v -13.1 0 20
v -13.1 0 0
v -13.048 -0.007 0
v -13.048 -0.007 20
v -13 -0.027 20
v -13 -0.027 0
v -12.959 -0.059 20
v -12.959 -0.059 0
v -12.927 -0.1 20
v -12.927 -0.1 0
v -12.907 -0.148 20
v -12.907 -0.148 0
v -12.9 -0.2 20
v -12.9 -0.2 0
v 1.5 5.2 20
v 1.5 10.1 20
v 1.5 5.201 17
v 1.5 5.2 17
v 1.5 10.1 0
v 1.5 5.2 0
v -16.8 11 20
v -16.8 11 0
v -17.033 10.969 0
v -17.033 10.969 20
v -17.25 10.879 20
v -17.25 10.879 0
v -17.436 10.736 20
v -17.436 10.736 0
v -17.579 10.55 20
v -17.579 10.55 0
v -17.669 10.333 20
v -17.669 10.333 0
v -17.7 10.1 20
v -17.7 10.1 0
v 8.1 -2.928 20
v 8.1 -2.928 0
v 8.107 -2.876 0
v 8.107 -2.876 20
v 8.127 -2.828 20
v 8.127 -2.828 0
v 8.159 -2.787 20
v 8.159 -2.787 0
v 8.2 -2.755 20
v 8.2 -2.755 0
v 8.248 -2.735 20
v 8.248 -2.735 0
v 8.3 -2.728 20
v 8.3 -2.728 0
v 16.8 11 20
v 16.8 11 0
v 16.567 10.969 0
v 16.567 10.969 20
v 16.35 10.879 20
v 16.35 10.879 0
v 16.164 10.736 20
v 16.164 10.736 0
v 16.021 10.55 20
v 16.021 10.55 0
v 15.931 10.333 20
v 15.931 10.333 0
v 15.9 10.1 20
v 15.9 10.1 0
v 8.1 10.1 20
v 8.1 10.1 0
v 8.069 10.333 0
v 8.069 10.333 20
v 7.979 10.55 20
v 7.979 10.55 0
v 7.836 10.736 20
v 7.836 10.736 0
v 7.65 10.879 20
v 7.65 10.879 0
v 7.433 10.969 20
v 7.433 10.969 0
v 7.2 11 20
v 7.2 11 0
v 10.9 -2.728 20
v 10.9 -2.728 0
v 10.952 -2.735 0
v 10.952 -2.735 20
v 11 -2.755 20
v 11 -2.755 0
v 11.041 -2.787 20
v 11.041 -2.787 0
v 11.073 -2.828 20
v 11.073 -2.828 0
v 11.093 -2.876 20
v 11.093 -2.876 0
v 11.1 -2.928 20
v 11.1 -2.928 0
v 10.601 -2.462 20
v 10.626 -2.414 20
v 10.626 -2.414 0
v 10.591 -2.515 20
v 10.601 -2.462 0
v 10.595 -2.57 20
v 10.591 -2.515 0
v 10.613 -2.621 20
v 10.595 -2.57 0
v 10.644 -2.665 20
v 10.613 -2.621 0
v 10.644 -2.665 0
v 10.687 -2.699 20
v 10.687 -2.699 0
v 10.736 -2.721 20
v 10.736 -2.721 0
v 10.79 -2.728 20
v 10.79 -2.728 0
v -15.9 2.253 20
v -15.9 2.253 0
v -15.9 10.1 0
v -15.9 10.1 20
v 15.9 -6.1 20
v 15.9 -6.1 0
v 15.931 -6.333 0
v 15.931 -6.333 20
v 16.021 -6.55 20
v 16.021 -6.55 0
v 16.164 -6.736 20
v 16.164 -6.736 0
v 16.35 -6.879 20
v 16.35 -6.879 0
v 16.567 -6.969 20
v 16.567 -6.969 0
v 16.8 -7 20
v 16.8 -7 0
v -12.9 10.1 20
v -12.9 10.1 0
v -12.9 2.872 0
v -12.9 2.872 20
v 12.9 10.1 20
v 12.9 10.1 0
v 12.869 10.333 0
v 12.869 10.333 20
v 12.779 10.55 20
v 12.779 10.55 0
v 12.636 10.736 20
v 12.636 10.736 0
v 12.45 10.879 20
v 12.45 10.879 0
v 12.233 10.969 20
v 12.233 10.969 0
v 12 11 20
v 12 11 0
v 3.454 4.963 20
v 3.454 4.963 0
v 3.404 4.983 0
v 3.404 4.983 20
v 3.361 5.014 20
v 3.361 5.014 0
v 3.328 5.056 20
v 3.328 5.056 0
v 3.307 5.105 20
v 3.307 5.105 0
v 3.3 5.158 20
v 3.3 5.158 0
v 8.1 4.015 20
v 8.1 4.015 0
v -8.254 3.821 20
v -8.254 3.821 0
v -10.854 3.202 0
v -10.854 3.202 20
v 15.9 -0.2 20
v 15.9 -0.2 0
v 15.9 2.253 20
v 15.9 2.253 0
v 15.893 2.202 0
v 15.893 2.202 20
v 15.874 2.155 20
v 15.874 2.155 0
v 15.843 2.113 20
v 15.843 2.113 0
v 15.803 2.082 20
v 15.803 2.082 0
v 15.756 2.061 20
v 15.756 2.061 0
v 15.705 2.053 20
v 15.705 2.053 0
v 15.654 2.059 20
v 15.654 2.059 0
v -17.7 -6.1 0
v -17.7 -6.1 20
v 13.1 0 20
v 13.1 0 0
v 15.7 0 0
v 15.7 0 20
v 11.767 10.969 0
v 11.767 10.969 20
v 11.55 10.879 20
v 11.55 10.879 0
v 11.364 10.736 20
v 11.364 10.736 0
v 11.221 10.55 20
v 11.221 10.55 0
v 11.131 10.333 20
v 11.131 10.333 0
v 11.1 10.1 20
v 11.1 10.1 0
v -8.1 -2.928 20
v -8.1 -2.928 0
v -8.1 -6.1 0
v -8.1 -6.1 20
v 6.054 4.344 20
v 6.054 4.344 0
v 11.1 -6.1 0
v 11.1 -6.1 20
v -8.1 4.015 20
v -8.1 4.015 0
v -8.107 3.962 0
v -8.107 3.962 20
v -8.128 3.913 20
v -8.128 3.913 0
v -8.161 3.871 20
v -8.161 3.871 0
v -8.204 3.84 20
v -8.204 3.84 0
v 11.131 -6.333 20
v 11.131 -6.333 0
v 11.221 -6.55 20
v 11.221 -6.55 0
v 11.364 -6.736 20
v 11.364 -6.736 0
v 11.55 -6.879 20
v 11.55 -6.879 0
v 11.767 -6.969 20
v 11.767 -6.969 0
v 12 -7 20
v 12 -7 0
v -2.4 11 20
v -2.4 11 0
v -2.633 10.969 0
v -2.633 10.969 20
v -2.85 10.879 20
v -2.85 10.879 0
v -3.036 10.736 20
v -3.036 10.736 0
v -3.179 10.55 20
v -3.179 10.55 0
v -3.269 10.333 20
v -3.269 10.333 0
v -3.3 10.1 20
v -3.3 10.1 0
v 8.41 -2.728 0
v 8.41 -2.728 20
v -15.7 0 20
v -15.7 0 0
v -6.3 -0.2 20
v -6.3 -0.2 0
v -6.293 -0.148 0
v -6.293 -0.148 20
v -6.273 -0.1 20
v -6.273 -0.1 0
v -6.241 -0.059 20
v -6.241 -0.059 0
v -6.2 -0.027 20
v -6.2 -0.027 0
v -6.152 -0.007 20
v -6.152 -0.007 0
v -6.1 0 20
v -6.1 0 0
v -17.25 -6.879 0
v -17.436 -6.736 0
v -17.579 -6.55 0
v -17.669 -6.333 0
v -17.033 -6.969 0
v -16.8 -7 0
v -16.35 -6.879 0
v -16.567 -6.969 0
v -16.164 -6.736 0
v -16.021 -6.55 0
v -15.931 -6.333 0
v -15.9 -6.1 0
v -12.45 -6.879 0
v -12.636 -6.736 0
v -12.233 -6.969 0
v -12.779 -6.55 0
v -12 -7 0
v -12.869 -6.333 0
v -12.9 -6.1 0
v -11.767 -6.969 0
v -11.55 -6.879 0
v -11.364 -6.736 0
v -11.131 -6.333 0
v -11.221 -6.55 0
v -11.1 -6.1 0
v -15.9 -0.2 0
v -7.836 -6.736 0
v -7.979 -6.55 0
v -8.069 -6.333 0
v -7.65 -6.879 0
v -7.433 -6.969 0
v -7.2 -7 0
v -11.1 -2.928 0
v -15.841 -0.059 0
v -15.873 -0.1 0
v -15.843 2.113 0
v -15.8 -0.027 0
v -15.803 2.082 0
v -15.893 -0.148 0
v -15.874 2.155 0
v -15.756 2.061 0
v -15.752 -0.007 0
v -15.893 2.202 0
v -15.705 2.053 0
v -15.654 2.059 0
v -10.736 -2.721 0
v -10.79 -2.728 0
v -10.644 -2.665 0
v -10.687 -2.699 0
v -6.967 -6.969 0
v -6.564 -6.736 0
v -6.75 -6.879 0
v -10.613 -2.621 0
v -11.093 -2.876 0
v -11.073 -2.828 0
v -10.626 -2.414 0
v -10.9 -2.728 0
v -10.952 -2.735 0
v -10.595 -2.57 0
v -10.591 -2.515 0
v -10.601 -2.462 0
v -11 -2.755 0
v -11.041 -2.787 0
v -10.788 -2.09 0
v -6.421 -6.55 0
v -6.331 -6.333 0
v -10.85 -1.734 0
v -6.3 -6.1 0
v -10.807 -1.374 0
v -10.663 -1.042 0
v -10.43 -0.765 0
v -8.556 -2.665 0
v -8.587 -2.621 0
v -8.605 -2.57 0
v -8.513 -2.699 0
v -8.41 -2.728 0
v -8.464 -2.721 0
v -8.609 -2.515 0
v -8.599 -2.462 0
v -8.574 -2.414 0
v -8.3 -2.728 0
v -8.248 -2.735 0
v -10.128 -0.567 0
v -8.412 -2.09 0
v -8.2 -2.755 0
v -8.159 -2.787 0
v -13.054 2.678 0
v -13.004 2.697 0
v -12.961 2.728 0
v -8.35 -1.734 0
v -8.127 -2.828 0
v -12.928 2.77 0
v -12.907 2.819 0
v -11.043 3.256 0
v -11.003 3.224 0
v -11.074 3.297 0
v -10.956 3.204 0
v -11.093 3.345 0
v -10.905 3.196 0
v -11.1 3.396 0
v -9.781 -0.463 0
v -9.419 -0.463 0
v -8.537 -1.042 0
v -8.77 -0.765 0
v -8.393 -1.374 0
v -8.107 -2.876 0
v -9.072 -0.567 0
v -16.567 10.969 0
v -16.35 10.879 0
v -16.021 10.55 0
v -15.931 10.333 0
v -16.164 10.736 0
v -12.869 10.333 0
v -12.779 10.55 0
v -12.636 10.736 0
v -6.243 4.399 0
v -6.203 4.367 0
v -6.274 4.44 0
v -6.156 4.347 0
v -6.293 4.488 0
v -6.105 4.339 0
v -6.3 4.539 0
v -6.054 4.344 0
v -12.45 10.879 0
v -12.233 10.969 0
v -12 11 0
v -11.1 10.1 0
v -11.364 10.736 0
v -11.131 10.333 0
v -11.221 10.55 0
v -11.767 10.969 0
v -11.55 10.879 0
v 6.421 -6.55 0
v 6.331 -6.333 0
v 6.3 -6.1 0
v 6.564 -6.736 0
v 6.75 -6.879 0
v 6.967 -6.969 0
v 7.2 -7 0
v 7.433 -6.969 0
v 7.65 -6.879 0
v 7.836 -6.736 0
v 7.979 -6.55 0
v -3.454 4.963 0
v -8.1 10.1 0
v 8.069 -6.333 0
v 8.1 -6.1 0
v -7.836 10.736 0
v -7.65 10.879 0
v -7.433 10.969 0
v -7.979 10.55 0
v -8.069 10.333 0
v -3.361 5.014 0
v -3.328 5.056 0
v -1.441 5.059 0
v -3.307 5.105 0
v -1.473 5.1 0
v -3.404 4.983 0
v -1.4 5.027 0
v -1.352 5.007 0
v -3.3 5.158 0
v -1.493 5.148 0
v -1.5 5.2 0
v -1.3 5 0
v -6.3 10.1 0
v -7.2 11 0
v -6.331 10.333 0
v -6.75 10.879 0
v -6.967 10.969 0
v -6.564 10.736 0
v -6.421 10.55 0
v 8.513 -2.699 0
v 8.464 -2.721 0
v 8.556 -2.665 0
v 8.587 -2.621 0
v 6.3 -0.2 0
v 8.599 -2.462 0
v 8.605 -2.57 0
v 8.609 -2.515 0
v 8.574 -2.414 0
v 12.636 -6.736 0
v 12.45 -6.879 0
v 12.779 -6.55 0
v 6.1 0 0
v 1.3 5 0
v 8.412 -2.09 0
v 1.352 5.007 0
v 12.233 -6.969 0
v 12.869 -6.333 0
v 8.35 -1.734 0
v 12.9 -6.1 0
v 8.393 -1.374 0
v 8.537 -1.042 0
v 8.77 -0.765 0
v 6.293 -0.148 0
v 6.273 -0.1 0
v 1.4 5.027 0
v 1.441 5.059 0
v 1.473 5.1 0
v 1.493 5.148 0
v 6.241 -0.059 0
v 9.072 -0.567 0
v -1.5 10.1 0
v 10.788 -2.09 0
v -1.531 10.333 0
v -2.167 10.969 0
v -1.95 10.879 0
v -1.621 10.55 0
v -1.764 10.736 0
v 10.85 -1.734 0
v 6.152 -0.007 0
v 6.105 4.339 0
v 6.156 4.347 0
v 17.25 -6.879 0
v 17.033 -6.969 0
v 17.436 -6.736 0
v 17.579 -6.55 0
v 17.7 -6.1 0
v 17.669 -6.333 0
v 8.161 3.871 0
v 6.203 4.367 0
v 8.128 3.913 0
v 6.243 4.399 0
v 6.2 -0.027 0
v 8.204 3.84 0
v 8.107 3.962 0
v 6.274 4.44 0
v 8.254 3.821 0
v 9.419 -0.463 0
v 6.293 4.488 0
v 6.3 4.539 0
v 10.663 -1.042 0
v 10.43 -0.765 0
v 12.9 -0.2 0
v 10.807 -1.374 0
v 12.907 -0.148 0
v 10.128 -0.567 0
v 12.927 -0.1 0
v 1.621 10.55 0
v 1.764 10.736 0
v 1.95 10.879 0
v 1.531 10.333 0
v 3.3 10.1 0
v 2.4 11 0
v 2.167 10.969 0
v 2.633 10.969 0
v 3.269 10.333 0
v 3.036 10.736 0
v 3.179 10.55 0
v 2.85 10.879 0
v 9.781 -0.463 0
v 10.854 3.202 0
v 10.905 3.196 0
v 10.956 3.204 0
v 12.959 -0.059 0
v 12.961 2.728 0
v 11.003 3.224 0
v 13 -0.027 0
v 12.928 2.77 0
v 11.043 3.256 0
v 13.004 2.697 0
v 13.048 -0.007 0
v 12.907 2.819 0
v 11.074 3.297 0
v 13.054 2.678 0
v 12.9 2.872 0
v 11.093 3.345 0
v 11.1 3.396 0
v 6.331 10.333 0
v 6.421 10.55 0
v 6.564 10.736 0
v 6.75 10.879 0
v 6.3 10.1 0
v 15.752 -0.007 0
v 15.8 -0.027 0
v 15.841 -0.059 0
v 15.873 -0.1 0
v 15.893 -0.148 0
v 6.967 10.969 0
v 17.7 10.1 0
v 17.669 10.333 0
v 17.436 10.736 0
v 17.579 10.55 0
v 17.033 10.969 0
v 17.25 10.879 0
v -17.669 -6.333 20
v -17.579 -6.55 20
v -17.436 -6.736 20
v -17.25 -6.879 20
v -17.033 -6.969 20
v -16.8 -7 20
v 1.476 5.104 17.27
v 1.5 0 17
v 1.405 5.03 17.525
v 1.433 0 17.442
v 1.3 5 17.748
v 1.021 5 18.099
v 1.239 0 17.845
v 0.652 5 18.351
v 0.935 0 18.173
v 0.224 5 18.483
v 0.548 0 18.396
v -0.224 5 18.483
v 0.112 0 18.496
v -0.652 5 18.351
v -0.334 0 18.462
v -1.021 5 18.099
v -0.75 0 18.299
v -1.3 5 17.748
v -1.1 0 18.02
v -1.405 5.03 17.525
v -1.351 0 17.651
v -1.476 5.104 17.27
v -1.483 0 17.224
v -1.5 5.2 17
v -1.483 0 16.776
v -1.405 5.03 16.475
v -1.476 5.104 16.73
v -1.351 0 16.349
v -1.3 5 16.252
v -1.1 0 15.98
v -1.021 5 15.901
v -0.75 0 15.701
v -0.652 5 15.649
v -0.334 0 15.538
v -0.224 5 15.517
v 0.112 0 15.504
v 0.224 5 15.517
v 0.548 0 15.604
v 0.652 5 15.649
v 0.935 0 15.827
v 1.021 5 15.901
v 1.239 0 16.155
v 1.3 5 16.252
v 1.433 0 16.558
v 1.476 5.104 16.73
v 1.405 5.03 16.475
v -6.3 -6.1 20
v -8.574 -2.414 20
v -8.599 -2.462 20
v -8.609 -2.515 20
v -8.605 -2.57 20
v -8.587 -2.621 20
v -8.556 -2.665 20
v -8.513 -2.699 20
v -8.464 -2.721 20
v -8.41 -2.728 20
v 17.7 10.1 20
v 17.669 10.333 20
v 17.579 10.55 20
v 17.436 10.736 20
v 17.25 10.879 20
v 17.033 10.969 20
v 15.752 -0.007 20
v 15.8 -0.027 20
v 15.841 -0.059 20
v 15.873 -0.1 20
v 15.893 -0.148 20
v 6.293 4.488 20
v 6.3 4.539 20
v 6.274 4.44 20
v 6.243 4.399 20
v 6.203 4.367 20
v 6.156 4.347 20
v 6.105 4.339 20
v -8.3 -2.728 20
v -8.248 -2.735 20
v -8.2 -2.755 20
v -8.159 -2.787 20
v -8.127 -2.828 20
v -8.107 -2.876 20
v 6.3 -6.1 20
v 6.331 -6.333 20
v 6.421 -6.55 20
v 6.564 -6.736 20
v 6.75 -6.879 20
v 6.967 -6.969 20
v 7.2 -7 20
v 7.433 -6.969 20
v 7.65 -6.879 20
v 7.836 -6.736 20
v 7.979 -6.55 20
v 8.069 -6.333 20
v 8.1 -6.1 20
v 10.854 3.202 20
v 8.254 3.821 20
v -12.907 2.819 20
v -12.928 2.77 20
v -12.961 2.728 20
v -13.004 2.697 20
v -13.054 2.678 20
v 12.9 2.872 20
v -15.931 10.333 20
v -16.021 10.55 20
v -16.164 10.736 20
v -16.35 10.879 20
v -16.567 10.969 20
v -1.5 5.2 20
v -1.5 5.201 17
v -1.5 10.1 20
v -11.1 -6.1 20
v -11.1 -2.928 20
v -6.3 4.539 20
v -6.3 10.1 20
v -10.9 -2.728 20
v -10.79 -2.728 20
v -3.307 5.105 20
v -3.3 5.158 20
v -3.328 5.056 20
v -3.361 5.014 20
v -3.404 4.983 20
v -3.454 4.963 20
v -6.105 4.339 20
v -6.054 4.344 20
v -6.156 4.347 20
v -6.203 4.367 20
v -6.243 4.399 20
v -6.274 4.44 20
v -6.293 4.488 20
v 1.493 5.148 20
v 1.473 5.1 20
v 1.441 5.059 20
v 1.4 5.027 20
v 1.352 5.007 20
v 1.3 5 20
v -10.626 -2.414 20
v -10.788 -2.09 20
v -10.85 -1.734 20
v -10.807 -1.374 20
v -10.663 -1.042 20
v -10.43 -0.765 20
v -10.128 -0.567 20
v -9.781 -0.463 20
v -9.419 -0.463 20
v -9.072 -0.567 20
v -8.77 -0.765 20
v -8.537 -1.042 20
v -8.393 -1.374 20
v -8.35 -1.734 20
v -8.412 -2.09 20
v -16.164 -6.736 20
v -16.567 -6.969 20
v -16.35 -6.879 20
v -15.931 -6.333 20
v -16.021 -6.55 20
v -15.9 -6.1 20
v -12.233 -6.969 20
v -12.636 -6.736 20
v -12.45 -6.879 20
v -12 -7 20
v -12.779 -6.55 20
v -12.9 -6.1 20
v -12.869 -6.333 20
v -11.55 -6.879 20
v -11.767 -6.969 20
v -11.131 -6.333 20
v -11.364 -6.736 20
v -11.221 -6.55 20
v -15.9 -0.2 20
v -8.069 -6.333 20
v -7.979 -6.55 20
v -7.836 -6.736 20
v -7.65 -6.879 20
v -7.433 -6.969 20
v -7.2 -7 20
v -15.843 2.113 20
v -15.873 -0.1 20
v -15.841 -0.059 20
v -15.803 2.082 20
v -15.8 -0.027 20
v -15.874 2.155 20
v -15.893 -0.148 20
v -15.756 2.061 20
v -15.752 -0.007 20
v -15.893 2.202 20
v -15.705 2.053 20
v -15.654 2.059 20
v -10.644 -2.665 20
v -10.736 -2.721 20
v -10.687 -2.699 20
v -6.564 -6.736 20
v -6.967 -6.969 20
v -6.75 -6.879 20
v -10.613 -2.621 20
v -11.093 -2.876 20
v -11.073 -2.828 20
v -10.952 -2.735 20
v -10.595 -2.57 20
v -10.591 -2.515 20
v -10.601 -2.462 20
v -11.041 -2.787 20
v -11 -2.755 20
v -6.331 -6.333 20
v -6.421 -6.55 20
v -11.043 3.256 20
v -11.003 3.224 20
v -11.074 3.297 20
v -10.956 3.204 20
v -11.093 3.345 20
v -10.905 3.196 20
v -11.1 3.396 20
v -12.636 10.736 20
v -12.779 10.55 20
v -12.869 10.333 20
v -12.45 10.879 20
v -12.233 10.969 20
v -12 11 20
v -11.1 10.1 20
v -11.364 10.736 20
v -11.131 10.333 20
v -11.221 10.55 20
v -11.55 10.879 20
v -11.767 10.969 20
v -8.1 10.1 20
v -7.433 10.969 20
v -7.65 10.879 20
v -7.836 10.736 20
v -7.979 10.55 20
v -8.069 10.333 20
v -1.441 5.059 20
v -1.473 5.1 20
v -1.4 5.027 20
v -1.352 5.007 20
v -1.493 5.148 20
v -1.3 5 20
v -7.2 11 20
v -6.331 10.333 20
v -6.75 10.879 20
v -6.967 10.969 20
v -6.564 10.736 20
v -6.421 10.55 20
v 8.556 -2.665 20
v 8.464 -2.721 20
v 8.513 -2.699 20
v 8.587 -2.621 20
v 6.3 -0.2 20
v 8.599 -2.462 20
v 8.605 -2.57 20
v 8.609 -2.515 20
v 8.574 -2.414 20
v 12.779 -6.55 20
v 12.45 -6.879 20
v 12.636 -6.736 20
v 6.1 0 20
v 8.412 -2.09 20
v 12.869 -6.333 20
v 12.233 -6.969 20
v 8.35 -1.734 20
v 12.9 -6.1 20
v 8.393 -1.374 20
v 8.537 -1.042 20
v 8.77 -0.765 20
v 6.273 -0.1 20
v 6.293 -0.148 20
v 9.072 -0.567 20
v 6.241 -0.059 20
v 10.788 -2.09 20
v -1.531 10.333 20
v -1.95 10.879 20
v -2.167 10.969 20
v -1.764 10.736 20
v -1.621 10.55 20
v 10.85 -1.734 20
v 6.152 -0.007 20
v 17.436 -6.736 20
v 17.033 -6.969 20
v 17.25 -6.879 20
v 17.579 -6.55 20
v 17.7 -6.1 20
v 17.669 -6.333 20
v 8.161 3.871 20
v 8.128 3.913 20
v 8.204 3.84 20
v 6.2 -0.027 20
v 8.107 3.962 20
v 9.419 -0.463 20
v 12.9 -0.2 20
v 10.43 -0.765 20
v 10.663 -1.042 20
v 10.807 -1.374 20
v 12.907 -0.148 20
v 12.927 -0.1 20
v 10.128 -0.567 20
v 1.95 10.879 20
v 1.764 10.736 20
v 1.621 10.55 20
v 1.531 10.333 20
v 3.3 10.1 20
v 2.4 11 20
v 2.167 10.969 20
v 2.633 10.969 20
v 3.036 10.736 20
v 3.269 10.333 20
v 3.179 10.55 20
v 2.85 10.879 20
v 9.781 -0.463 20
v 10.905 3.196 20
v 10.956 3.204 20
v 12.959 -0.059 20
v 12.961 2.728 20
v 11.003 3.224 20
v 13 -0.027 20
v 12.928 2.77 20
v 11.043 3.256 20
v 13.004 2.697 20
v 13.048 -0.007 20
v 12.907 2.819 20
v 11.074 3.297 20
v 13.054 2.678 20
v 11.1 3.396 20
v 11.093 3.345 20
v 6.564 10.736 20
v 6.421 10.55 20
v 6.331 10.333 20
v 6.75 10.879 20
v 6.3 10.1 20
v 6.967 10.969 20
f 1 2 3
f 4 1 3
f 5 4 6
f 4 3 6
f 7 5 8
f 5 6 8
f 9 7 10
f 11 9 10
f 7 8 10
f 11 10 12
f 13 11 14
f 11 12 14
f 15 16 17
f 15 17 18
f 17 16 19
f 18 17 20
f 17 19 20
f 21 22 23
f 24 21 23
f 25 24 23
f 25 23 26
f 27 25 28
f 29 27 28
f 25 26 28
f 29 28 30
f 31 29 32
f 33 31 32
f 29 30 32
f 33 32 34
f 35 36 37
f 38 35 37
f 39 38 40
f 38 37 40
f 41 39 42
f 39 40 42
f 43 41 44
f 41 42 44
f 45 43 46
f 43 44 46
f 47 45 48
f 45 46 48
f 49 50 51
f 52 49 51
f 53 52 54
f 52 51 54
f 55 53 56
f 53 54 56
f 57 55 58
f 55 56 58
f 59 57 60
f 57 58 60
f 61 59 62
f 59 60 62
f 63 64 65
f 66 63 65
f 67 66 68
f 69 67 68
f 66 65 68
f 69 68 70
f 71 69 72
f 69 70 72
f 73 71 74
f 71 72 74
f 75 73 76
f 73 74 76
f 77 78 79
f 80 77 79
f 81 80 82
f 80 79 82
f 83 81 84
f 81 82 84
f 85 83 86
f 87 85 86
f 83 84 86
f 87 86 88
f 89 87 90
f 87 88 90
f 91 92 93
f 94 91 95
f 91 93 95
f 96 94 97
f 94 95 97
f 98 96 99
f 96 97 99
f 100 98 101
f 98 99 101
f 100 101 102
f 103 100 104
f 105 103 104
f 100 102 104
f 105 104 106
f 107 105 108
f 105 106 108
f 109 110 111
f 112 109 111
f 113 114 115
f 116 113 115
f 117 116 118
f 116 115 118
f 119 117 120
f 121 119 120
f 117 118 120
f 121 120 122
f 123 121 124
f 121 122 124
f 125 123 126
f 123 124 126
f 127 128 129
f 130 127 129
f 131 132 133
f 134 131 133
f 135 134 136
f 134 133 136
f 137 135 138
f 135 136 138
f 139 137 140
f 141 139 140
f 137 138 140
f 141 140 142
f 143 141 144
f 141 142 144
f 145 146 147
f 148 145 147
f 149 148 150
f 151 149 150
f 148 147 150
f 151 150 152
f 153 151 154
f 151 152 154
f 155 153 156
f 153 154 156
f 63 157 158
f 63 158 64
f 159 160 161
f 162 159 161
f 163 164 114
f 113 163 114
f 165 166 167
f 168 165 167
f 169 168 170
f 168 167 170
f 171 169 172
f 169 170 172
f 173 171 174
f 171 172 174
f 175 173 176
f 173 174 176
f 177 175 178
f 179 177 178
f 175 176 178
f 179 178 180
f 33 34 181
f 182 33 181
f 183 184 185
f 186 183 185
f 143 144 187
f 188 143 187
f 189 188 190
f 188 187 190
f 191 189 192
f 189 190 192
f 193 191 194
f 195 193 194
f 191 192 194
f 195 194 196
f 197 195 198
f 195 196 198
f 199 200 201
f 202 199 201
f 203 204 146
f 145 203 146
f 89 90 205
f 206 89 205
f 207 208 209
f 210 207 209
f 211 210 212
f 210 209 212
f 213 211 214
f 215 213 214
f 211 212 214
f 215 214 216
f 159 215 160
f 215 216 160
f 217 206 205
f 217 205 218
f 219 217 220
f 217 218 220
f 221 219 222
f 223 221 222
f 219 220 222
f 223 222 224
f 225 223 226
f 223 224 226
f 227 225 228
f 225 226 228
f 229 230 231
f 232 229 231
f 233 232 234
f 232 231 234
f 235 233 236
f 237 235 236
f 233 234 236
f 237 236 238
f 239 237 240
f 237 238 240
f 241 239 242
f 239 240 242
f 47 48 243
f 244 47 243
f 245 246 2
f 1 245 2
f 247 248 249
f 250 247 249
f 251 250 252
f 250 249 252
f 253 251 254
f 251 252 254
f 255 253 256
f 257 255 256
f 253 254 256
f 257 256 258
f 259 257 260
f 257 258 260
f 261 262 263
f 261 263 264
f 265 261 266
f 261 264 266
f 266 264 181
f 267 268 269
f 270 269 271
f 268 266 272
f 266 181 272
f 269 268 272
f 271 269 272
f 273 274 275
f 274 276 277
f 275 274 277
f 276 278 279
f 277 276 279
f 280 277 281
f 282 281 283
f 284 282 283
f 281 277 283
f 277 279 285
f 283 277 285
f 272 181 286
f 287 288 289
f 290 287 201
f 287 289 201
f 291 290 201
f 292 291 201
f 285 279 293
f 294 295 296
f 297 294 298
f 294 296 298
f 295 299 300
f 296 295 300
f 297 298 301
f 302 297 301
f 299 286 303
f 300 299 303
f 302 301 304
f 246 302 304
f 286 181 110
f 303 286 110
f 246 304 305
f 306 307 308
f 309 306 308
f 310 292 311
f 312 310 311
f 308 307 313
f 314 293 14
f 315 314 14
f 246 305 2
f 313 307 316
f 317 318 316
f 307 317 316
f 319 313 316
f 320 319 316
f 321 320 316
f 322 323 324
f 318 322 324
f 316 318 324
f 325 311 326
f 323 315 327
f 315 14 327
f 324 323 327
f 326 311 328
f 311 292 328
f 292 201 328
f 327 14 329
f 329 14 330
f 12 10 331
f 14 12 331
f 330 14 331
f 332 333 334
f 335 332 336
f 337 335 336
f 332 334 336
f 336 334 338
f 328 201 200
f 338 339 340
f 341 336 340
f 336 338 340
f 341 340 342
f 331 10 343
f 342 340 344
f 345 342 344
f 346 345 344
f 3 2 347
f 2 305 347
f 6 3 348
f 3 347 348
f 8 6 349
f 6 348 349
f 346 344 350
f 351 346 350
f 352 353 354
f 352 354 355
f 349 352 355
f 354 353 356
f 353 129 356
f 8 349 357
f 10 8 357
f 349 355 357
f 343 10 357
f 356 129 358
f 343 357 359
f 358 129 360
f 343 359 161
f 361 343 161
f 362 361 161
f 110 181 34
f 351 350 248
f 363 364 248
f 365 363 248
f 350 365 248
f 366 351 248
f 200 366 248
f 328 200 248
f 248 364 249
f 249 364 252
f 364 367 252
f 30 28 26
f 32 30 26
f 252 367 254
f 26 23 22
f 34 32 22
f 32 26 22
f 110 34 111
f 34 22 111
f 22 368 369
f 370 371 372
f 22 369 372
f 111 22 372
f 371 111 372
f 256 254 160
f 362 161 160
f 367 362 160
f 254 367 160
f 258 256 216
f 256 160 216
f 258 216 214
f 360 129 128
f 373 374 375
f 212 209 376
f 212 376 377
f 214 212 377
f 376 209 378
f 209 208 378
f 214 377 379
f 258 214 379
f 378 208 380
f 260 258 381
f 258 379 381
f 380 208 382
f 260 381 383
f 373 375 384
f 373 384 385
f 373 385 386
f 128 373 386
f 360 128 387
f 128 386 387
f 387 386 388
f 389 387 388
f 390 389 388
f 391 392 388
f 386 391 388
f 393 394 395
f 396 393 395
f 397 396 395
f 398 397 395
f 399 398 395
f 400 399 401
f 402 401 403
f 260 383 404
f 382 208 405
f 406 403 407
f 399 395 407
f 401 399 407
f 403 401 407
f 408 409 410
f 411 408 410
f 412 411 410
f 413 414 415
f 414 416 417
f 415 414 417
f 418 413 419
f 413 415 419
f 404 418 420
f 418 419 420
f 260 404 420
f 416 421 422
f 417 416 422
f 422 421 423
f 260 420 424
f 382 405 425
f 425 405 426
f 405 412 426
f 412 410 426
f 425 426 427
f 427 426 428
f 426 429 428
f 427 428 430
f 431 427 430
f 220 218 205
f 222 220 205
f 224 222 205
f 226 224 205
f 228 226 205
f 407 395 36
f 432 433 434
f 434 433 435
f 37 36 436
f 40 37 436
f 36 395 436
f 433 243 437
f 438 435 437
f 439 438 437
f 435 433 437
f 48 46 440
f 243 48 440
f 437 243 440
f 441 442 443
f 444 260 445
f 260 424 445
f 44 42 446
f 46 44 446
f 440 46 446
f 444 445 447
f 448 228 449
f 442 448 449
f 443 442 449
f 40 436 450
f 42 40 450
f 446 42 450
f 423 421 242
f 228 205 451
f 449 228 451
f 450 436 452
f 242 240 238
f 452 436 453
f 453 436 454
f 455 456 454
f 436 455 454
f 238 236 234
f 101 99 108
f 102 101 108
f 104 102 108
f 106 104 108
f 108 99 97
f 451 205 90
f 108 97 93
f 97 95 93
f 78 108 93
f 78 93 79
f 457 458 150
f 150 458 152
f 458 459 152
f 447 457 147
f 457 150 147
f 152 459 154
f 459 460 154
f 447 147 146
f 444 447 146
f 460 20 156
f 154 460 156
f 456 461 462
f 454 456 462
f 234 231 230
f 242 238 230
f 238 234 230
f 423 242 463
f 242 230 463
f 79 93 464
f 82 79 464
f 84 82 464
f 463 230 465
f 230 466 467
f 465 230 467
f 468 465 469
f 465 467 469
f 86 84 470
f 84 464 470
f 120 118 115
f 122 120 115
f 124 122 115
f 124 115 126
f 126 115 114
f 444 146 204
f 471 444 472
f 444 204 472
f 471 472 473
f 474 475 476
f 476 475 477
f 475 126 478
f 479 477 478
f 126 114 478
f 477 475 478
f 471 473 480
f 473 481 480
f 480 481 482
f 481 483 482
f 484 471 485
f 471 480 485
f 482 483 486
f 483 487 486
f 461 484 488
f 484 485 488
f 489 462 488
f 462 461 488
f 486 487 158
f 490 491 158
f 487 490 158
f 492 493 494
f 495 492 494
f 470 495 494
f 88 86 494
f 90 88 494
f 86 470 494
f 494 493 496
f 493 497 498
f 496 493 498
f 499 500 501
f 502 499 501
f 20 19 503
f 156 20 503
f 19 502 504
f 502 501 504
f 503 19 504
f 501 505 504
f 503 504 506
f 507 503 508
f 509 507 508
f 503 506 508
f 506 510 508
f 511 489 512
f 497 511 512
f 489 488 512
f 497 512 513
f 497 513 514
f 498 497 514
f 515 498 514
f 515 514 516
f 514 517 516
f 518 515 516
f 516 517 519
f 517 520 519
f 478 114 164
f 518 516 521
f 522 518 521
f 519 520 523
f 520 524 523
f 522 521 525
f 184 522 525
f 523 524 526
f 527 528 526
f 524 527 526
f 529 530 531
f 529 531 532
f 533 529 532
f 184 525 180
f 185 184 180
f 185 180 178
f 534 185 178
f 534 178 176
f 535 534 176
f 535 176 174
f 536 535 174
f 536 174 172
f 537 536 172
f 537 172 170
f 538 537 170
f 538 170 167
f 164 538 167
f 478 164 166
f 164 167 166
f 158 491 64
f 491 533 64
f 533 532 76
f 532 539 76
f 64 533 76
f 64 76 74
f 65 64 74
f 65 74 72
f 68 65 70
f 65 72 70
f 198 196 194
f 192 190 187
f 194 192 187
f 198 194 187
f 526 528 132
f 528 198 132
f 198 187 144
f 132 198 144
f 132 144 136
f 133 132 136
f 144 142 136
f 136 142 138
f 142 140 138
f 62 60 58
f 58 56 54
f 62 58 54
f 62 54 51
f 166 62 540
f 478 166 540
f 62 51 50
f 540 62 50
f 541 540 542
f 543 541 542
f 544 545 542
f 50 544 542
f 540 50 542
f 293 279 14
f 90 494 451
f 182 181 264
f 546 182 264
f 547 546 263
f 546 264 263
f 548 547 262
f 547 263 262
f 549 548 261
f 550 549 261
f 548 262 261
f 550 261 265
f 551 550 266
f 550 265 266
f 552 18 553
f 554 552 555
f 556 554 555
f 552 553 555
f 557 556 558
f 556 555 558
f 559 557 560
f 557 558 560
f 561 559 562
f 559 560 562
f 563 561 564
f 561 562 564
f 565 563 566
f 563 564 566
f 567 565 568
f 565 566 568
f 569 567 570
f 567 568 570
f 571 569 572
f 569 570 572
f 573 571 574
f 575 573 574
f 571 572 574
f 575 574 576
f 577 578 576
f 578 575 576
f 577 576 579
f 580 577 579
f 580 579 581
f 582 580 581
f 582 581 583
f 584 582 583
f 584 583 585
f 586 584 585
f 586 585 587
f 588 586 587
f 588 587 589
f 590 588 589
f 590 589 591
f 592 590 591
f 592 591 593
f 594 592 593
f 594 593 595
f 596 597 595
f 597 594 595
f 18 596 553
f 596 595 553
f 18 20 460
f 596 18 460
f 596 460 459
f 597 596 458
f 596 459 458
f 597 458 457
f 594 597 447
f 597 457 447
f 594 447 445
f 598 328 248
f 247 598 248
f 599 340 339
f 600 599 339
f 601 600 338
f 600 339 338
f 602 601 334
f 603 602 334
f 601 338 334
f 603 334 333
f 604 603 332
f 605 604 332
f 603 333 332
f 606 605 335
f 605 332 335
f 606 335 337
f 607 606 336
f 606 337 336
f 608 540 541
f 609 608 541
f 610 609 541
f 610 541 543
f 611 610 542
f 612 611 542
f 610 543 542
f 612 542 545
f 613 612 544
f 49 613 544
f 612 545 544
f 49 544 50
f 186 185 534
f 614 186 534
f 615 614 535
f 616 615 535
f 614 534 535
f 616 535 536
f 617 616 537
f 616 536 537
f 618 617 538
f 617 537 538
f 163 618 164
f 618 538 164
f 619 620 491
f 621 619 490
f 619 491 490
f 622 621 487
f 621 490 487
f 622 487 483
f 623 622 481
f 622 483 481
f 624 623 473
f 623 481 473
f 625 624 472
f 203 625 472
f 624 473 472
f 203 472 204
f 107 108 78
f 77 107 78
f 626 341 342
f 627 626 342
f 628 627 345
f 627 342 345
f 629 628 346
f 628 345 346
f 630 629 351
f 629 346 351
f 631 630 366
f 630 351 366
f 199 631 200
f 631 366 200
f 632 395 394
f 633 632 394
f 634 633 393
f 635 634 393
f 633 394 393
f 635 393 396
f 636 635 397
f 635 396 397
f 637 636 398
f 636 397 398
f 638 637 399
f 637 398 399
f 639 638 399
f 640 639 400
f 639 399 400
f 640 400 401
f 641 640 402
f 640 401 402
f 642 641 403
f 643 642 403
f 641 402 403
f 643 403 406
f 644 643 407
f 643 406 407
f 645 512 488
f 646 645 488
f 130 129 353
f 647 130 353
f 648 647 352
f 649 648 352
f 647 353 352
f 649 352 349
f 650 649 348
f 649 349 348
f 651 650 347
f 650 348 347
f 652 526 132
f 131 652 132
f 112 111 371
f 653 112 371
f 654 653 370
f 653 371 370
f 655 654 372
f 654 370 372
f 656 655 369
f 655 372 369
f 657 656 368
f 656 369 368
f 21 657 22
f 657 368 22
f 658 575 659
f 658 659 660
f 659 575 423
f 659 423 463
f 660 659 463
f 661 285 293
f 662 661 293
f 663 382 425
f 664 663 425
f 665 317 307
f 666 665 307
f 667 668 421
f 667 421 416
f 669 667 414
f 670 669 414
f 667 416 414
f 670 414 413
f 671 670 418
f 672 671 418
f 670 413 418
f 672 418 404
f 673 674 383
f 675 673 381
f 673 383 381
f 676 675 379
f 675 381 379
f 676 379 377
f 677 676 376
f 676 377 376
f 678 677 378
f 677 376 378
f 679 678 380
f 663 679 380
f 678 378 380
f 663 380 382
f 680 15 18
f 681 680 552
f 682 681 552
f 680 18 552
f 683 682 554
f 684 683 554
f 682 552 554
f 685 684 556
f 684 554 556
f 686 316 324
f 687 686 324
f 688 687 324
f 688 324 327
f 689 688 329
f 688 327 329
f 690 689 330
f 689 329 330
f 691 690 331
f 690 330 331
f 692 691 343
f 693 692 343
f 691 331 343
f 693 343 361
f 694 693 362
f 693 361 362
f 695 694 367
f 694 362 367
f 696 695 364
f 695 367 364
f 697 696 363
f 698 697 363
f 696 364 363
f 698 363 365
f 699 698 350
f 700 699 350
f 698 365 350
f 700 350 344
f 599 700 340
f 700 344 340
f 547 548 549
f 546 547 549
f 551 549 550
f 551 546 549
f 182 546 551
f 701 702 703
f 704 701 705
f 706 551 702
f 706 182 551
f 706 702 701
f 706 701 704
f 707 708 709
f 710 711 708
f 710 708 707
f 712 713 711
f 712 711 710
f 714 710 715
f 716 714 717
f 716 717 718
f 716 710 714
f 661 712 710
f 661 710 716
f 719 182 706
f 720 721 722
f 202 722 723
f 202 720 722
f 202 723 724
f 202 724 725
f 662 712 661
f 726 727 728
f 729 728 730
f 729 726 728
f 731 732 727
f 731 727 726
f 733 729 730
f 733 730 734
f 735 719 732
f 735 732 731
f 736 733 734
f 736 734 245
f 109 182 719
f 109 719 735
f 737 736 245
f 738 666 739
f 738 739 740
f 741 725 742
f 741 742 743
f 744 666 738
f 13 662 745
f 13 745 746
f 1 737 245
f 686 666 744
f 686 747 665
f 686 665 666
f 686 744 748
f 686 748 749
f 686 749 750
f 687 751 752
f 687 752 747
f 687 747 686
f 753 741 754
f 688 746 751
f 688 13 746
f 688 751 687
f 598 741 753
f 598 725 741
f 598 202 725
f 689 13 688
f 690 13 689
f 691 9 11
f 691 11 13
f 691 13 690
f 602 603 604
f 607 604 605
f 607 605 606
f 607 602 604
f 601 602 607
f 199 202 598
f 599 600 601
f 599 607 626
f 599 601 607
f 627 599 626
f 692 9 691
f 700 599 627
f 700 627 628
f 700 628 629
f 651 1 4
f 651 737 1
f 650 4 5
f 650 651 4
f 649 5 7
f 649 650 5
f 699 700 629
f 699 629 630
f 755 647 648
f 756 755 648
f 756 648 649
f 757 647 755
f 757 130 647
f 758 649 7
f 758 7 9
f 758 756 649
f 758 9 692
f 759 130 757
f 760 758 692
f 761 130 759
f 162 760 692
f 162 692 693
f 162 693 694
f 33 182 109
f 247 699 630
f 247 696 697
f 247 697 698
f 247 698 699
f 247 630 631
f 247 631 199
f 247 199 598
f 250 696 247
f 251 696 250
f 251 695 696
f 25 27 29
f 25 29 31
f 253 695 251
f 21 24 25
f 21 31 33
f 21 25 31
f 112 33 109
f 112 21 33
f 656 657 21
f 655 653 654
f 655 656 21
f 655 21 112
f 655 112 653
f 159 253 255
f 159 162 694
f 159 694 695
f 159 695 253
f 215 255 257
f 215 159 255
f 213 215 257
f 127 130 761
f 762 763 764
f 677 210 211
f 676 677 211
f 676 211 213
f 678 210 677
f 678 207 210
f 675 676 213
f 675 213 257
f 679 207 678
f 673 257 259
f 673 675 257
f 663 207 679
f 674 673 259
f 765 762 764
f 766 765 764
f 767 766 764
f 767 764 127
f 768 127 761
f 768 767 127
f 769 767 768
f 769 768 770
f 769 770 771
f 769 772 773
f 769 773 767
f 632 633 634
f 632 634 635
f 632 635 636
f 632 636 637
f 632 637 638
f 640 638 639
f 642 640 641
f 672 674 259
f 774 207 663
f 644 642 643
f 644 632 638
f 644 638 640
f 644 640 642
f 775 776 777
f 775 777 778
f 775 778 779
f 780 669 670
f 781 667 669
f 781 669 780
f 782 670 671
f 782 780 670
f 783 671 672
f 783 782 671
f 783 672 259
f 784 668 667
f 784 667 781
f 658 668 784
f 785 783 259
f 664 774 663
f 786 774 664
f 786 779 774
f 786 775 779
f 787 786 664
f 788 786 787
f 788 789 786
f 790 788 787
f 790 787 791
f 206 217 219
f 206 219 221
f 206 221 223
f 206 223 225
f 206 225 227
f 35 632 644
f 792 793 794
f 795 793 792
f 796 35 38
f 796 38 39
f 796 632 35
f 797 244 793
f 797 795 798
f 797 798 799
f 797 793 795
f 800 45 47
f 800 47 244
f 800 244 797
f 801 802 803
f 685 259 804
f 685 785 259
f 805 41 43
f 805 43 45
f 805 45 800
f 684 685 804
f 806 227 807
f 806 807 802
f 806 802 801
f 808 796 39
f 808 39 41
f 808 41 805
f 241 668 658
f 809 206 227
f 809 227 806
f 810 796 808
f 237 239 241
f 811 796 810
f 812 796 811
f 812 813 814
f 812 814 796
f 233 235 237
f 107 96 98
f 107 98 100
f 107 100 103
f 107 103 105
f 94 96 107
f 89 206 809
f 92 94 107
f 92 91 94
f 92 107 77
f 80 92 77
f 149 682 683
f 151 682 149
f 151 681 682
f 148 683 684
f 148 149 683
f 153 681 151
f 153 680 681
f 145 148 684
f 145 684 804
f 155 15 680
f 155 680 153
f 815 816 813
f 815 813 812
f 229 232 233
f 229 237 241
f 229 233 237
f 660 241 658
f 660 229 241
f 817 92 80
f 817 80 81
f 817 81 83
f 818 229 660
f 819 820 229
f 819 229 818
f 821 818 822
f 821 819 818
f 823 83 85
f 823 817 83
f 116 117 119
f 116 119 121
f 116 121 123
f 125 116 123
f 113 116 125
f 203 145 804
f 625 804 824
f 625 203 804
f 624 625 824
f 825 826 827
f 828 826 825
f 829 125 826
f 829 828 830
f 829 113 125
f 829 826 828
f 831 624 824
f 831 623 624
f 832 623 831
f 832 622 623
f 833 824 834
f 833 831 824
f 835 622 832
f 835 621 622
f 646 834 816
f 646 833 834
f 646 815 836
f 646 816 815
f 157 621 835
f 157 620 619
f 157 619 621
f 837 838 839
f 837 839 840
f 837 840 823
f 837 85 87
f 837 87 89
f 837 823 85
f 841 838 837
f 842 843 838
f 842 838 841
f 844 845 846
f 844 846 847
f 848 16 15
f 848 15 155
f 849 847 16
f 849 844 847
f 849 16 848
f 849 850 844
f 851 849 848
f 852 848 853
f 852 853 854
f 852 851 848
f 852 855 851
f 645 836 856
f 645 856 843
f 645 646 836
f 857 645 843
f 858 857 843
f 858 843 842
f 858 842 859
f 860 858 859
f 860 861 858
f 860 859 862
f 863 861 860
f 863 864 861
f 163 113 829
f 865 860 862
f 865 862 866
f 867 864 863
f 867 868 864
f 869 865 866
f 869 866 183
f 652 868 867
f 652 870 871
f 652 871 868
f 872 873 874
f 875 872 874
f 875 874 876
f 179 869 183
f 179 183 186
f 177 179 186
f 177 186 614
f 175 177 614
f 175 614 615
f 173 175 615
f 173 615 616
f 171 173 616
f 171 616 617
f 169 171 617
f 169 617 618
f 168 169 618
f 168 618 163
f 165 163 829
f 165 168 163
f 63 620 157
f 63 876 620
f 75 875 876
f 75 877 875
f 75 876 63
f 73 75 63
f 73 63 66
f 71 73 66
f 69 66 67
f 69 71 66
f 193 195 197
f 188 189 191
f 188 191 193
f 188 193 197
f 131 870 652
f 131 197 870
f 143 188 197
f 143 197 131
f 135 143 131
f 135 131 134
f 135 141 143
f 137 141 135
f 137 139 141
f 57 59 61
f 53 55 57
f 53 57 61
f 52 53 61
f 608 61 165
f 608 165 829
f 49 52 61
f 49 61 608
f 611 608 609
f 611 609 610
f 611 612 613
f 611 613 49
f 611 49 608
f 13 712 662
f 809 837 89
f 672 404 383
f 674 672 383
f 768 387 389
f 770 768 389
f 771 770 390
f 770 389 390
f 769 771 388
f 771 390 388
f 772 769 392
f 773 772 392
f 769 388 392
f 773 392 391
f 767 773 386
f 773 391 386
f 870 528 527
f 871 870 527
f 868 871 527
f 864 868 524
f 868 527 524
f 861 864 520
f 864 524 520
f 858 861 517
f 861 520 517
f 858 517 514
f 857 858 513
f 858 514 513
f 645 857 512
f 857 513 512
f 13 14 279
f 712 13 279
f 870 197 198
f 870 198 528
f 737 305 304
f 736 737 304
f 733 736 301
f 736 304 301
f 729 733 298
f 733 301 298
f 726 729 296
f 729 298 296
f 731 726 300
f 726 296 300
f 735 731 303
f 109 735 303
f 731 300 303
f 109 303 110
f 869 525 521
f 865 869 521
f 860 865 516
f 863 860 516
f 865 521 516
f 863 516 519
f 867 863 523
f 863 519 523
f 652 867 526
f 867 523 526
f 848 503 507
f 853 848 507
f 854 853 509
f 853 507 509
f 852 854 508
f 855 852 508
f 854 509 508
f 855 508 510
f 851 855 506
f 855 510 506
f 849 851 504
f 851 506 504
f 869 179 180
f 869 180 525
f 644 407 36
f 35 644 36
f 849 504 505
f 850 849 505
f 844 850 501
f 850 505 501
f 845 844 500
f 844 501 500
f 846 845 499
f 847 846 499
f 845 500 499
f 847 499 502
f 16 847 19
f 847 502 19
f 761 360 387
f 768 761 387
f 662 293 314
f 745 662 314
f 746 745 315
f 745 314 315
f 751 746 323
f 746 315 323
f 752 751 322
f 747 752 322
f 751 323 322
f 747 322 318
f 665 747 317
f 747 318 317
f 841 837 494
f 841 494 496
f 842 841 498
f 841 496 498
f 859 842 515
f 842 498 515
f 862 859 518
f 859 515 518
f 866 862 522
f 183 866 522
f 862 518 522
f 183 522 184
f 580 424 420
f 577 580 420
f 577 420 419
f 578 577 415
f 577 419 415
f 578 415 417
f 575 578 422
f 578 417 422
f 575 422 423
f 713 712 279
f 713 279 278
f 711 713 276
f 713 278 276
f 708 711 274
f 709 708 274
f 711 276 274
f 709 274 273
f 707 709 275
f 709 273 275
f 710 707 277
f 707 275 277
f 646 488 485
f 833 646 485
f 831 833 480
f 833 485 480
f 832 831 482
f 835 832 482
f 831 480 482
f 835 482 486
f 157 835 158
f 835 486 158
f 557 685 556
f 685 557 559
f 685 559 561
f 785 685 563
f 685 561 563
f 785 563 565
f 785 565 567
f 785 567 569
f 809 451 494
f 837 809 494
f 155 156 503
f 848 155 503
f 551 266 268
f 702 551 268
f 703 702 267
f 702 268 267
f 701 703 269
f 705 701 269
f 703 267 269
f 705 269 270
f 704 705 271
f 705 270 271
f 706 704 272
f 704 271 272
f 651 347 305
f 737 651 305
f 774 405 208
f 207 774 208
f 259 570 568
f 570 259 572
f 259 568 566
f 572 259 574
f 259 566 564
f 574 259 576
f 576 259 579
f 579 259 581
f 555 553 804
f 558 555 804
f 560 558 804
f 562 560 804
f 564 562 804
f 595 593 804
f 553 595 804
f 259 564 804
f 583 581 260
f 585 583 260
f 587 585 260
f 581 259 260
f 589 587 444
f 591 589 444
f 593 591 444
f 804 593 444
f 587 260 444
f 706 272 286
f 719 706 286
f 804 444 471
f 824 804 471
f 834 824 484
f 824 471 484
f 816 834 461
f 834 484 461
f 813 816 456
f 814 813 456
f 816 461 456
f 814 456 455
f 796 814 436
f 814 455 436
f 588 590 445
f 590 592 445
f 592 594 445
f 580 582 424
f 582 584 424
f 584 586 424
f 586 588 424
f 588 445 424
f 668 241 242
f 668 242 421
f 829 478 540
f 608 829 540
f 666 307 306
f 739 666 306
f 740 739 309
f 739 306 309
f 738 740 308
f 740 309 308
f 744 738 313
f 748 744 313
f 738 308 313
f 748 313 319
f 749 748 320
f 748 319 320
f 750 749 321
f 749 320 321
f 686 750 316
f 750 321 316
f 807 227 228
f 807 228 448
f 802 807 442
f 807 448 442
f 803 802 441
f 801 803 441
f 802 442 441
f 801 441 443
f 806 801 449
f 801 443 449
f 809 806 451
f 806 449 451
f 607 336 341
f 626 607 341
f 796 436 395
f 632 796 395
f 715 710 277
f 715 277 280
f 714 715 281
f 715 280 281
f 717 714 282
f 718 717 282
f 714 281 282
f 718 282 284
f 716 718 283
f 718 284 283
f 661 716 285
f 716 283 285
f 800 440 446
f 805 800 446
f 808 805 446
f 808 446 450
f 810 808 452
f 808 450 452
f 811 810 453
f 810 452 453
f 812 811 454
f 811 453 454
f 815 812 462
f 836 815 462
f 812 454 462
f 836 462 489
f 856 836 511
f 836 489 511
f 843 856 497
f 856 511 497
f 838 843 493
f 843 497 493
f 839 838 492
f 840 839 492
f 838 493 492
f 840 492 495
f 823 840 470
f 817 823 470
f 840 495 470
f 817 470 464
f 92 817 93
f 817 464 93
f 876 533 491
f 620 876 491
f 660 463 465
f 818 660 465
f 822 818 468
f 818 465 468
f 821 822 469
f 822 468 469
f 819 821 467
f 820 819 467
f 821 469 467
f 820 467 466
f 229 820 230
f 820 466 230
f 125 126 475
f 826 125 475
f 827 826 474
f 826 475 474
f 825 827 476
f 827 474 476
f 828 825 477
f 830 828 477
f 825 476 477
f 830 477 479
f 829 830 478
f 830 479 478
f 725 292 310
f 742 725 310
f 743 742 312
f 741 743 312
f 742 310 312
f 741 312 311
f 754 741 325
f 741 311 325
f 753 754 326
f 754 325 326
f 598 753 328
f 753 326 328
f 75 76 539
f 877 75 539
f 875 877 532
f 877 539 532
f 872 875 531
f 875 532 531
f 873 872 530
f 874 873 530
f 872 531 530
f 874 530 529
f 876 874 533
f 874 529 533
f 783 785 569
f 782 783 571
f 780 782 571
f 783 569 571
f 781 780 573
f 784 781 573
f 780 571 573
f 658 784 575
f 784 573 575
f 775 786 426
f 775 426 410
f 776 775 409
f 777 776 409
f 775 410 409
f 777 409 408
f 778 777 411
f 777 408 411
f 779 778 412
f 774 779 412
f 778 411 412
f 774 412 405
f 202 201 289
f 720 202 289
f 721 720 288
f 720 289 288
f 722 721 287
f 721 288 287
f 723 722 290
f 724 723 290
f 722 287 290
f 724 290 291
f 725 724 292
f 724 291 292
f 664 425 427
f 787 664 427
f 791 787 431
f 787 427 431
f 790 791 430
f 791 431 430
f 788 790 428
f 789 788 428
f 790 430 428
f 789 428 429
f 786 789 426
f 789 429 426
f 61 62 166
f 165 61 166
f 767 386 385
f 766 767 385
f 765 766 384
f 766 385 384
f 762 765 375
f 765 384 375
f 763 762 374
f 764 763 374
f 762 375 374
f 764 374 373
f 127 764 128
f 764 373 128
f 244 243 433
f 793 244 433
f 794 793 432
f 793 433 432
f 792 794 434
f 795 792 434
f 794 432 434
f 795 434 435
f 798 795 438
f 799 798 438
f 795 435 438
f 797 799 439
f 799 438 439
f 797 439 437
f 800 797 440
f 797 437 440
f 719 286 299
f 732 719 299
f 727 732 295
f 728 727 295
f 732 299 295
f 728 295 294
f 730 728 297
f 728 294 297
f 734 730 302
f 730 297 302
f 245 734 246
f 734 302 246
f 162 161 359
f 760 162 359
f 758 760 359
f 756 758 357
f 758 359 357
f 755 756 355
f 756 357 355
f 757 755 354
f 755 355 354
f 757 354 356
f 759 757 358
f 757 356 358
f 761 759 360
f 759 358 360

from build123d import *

# Parameters (mm, degrees)
F1_DEPTH = 20
F2_R     = 1.5
F3_DEPTH = 5.2010001


with BuildPart() as f1:
    # F0 (on Top) → F1 (new body)
    with BuildSketch(Plane.XY):
        with BuildLine():
            Line((-17.7, 10.1), (-17.7, 0))
            Line((-17.7, 0), (-17.7, -6.1))
            ThreePointArc((-17.7, -6.1), (-17.4363961031, -6.7363961031), (-16.8, -7))
            ThreePointArc((-16.8, -7), (-16.1636038969, -6.7363961031), (-15.9, -6.1))
            Line((-15.9, -6.1), (-15.9, -2.9281131564))
            Line((-15.9, -2.9281131564), (-15.9, -0.2))
            ThreePointArc((-15.9, -0.2), (-15.8414213562, -0.0585786438), (-15.7, 0))
            Line((-15.7, 0), (-13.1, 0))
            ThreePointArc((-13.1, 0), (-12.9585786438, -0.0585786438), (-12.9, -0.2))
            Line((-12.9, -0.2), (-12.9, -2.9281131564))
            Line((-12.9, -2.9281131564), (-12.9, -6.1))
            ThreePointArc((-12.9, -6.1), (-12.6363961031, -6.7363961031), (-12, -7))
            ThreePointArc((-12, -7), (-11.3636038969, -6.7363961031), (-11.1, -6.1))
            Line((-11.1, -6.1), (-11.1, -2.9281131564))
            ThreePointArc((-11.1, -2.9281131564), (-11.0414213562, -2.7866918002), (-10.9, -2.7281131564))
            Line((-10.9, -2.7281131564), (-10.7902640884, -2.7281131564))
            ThreePointArc((-10.7902640884, -2.7281131564), (-10.6130008648, -2.6207292974), (-10.6260897314, -2.4138906521))
            ThreePointArc((-10.6260897314, -2.4138906521), (-9.6, -0.45), (-8.5739102686, -2.4138906521))
            ThreePointArc((-8.5739102686, -2.4138906521), (-8.5869991352, -2.6207292974), (-8.4097359116, -2.7281131564))
            Line((-8.4097359116, -2.7281131564), (-8.3, -2.7281131564))
            ThreePointArc((-8.3, -2.7281131564), (-8.1585786438, -2.7866918002), (-8.1, -2.9281131564))
            Line((-8.1, -2.9281131564), (-8.1, -6.1))
            ThreePointArc((-8.1, -6.1), (-7.8363961031, -6.7363961031), (-7.2, -7))
            ThreePointArc((-7.2, -7), (-6.5636038969, -6.7363961031), (-6.3, -6.1))
            Line((-6.3, -6.1), (-6.3, -0.2))
            ThreePointArc((-6.3, -0.2), (-6.2414213562, -0.0585786438), (-6.1, 0))
            Line((-6.1, 0), (6.1, 0))
            ThreePointArc((6.1, 0), (6.2414213562, -0.0585786438), (6.3, -0.2))
            Line((6.3, -0.2), (6.3, -6.1))
            ThreePointArc((6.3, -6.1), (6.5636038969, -6.7363961031), (7.2, -7))
            ThreePointArc((7.2, -7), (7.8363961031, -6.7363961031), (8.1, -6.1))
            Line((8.1, -6.1), (8.1, -2.9281131564))
            ThreePointArc((8.1, -2.9281131564), (8.1585786438, -2.7866918002), (8.3, -2.7281131564))
            Line((8.3, -2.7281131564), (8.4097359116, -2.7281131564))
            ThreePointArc((8.4097359116, -2.7281131564), (8.5869991352, -2.6207292974), (8.5739102686, -2.4138906521))
            ThreePointArc((8.5739102686, -2.4138906521), (9.6, -0.45), (10.6260897314, -2.4138906521))
            ThreePointArc((10.6260897314, -2.4138906521), (10.6130008648, -2.6207292974), (10.7902640884, -2.7281131564))
            Line((10.7902640884, -2.7281131564), (10.9, -2.7281131564))
            ThreePointArc((10.9, -2.7281131564), (11.0414213562, -2.7866918002), (11.1, -2.9281131564))
            Line((11.1, -2.9281131564), (11.1, -6.1))
            ThreePointArc((11.1, -6.1), (11.3636038969, -6.7363961031), (12, -7))
            ThreePointArc((12, -7), (12.6363961031, -6.7363961031), (12.9, -6.1))
            Line((12.9, -6.1), (12.9, -2.9281131564))
            Line((12.9, -2.9281131564), (12.9, -0.2))
            ThreePointArc((12.9, -0.2), (12.9585786438, -0.0585786438), (13.1, 0))
            Line((13.1, 0), (15.7, 0))
            ThreePointArc((15.7, 0), (15.8414213562, -0.0585786438), (15.9, -0.2))
            Line((15.9, -0.2), (15.9, -2.9281131564))
            Line((15.9, -2.9281131564), (15.9, -6.1))
            ThreePointArc((15.9, -6.1), (16.1636038969, -6.7363961031), (16.8, -7))
            ThreePointArc((16.8, -7), (17.4363961031, -6.7363961031), (17.7, -6.1))
            Line((17.7, -6.1), (17.7, 0))
            Line((17.7, 0), (17.7, 10.1))
            ThreePointArc((17.7, 10.1), (17.4363961031, 10.7363961031), (16.8, 11))
            ThreePointArc((16.8, 11), (16.1636038969, 10.7363961031), (15.9, 10.1))
            Line((15.9, 10.1), (15.9, 2.2532098395))
            ThreePointArc((15.9, 2.2532098395), (15.8239660819, 2.096262681), (15.6536758945, 2.0586485965))
            Line((15.6536758945, 2.0586485965), (13.0536758945, 2.6776962156))
            ThreePointArc((13.0536758945, 2.6776962156), (12.9430528415, 2.7482913767), (12.9, 2.8722574585))
            Line((12.9, 2.8722574585), (12.9, 10.1))
            ThreePointArc((12.9, 10.1), (12.6363961031, 10.7363961031), (12, 11))
            ThreePointArc((12, 11), (11.3636038969, 10.7363961031), (11.1, 10.1))
            Line((11.1, 10.1), (11.1, 3.3960669823))
            ThreePointArc((11.1, 3.3960669823), (11.0239660819, 3.2391198239), (10.8536758945, 3.2015057394))
            Line((10.8536758945, 3.2015057394), (8.2536758945, 3.8205533584))
            ThreePointArc((8.2536758945, 3.8205533584), (8.1430528415, 3.8911485195), (8.1, 4.0151146014))
            Line((8.1, 4.0151146014), (8.1, 10.1))
            ThreePointArc((8.1, 10.1), (7.8363961031, 10.7363961031), (7.2, 11))
            ThreePointArc((7.2, 11), (6.5636038969, 10.7363961031), (6.3, 10.1))
            Line((6.3, 10.1), (6.3, 4.5389241252))
            ThreePointArc((6.3, 4.5389241252), (6.2239660819, 4.3819769667), (6.0536758945, 4.3443628823))
            Line((6.0536758945, 4.3443628823), (3.4536758945, 4.9634105013))
            ThreePointArc((3.4536758945, 4.9634105013), (3.3430528415, 5.0340056624), (3.3, 5.1579717442))
            Line((3.3, 5.1579717442), (3.3, 10.1))
            ThreePointArc((3.3, 10.1), (3.0363961031, 10.7363961031), (2.4, 11))
            ThreePointArc((2.4, 11), (1.7636038969, 10.7363961031), (1.5, 10.1))
            Line((1.5, 10.1), (1.5, 5.2))
            ThreePointArc((1.5, 5.2), (1.4414213562, 5.0585786438), (1.3, 5))
            Line((1.3, 5), (-1.3, 5))
            ThreePointArc((-1.3, 5), (-1.4414213562, 5.0585786438), (-1.5, 5.2))
            Line((-1.5, 5.2), (-1.5, 10.1))
            ThreePointArc((-1.5, 10.1), (-1.7636038969, 10.7363961031), (-2.4, 11))
            ThreePointArc((-2.4, 11), (-3.0363961031, 10.7363961031), (-3.3, 10.1))
            Line((-3.3, 10.1), (-3.3, 5.1579717442))
            ThreePointArc((-3.3, 5.1579717442), (-3.3430528415, 5.0340056624), (-3.4536758945, 4.9634105013))
            Line((-3.4536758945, 4.9634105013), (-6.0536758945, 4.3443628823))
            ThreePointArc((-6.0536758945, 4.3443628823), (-6.2239660819, 4.3819769667), (-6.3, 4.5389241252))
            Line((-6.3, 4.5389241252), (-6.3, 10.1))
            ThreePointArc((-6.3, 10.1), (-6.5636038969, 10.7363961031), (-7.2, 11))
            ThreePointArc((-7.2, 11), (-7.8363961031, 10.7363961031), (-8.1, 10.1))
            Line((-8.1, 10.1), (-8.1, 4.0151146014))
            ThreePointArc((-8.1, 4.0151146014), (-8.1430528415, 3.8911485195), (-8.2536758945, 3.8205533584))
            Line((-8.2536758945, 3.8205533584), (-10.8536758945, 3.2015057394))
            ThreePointArc((-10.8536758945, 3.2015057394), (-11.0239660819, 3.2391198239), (-11.1, 3.3960669823))
            Line((-11.1, 3.3960669823), (-11.1, 10.1))
            ThreePointArc((-11.1, 10.1), (-11.3636038969, 10.7363961031), (-12, 11))
            ThreePointArc((-12, 11), (-12.6363961031, 10.7363961031), (-12.9, 10.1))
            Line((-12.9, 10.1), (-12.9, 2.8722574585))
            ThreePointArc((-12.9, 2.8722574585), (-12.9430528415, 2.7482913767), (-13.0536758945, 2.6776962156))
            Line((-13.0536758945, 2.6776962156), (-15.6536758945, 2.0586485965))
            ThreePointArc((-15.6536758945, 2.0586485965), (-15.8239660819, 2.096262681), (-15.9, 2.2532098395))
            Line((-15.9, 2.2532098395), (-15.9, 10.1))
            ThreePointArc((-15.9, 10.1), (-16.1636038969, 10.7363961031), (-16.8, 11))
            ThreePointArc((-16.8, 11), (-17.4363961031, 10.7363961031), (-17.7, 10.1))
        make_face()
    extrude(amount=F1_DEPTH)

    # F2 (on face) → F3 (cut, through all)
    with BuildSketch(Plane.XZ):
        with Locations((0, 17)):
            Circle(F2_R)
    extrude(amount=-F3_DEPTH, mode=Mode.SUBTRACT)


solid = f1.part
